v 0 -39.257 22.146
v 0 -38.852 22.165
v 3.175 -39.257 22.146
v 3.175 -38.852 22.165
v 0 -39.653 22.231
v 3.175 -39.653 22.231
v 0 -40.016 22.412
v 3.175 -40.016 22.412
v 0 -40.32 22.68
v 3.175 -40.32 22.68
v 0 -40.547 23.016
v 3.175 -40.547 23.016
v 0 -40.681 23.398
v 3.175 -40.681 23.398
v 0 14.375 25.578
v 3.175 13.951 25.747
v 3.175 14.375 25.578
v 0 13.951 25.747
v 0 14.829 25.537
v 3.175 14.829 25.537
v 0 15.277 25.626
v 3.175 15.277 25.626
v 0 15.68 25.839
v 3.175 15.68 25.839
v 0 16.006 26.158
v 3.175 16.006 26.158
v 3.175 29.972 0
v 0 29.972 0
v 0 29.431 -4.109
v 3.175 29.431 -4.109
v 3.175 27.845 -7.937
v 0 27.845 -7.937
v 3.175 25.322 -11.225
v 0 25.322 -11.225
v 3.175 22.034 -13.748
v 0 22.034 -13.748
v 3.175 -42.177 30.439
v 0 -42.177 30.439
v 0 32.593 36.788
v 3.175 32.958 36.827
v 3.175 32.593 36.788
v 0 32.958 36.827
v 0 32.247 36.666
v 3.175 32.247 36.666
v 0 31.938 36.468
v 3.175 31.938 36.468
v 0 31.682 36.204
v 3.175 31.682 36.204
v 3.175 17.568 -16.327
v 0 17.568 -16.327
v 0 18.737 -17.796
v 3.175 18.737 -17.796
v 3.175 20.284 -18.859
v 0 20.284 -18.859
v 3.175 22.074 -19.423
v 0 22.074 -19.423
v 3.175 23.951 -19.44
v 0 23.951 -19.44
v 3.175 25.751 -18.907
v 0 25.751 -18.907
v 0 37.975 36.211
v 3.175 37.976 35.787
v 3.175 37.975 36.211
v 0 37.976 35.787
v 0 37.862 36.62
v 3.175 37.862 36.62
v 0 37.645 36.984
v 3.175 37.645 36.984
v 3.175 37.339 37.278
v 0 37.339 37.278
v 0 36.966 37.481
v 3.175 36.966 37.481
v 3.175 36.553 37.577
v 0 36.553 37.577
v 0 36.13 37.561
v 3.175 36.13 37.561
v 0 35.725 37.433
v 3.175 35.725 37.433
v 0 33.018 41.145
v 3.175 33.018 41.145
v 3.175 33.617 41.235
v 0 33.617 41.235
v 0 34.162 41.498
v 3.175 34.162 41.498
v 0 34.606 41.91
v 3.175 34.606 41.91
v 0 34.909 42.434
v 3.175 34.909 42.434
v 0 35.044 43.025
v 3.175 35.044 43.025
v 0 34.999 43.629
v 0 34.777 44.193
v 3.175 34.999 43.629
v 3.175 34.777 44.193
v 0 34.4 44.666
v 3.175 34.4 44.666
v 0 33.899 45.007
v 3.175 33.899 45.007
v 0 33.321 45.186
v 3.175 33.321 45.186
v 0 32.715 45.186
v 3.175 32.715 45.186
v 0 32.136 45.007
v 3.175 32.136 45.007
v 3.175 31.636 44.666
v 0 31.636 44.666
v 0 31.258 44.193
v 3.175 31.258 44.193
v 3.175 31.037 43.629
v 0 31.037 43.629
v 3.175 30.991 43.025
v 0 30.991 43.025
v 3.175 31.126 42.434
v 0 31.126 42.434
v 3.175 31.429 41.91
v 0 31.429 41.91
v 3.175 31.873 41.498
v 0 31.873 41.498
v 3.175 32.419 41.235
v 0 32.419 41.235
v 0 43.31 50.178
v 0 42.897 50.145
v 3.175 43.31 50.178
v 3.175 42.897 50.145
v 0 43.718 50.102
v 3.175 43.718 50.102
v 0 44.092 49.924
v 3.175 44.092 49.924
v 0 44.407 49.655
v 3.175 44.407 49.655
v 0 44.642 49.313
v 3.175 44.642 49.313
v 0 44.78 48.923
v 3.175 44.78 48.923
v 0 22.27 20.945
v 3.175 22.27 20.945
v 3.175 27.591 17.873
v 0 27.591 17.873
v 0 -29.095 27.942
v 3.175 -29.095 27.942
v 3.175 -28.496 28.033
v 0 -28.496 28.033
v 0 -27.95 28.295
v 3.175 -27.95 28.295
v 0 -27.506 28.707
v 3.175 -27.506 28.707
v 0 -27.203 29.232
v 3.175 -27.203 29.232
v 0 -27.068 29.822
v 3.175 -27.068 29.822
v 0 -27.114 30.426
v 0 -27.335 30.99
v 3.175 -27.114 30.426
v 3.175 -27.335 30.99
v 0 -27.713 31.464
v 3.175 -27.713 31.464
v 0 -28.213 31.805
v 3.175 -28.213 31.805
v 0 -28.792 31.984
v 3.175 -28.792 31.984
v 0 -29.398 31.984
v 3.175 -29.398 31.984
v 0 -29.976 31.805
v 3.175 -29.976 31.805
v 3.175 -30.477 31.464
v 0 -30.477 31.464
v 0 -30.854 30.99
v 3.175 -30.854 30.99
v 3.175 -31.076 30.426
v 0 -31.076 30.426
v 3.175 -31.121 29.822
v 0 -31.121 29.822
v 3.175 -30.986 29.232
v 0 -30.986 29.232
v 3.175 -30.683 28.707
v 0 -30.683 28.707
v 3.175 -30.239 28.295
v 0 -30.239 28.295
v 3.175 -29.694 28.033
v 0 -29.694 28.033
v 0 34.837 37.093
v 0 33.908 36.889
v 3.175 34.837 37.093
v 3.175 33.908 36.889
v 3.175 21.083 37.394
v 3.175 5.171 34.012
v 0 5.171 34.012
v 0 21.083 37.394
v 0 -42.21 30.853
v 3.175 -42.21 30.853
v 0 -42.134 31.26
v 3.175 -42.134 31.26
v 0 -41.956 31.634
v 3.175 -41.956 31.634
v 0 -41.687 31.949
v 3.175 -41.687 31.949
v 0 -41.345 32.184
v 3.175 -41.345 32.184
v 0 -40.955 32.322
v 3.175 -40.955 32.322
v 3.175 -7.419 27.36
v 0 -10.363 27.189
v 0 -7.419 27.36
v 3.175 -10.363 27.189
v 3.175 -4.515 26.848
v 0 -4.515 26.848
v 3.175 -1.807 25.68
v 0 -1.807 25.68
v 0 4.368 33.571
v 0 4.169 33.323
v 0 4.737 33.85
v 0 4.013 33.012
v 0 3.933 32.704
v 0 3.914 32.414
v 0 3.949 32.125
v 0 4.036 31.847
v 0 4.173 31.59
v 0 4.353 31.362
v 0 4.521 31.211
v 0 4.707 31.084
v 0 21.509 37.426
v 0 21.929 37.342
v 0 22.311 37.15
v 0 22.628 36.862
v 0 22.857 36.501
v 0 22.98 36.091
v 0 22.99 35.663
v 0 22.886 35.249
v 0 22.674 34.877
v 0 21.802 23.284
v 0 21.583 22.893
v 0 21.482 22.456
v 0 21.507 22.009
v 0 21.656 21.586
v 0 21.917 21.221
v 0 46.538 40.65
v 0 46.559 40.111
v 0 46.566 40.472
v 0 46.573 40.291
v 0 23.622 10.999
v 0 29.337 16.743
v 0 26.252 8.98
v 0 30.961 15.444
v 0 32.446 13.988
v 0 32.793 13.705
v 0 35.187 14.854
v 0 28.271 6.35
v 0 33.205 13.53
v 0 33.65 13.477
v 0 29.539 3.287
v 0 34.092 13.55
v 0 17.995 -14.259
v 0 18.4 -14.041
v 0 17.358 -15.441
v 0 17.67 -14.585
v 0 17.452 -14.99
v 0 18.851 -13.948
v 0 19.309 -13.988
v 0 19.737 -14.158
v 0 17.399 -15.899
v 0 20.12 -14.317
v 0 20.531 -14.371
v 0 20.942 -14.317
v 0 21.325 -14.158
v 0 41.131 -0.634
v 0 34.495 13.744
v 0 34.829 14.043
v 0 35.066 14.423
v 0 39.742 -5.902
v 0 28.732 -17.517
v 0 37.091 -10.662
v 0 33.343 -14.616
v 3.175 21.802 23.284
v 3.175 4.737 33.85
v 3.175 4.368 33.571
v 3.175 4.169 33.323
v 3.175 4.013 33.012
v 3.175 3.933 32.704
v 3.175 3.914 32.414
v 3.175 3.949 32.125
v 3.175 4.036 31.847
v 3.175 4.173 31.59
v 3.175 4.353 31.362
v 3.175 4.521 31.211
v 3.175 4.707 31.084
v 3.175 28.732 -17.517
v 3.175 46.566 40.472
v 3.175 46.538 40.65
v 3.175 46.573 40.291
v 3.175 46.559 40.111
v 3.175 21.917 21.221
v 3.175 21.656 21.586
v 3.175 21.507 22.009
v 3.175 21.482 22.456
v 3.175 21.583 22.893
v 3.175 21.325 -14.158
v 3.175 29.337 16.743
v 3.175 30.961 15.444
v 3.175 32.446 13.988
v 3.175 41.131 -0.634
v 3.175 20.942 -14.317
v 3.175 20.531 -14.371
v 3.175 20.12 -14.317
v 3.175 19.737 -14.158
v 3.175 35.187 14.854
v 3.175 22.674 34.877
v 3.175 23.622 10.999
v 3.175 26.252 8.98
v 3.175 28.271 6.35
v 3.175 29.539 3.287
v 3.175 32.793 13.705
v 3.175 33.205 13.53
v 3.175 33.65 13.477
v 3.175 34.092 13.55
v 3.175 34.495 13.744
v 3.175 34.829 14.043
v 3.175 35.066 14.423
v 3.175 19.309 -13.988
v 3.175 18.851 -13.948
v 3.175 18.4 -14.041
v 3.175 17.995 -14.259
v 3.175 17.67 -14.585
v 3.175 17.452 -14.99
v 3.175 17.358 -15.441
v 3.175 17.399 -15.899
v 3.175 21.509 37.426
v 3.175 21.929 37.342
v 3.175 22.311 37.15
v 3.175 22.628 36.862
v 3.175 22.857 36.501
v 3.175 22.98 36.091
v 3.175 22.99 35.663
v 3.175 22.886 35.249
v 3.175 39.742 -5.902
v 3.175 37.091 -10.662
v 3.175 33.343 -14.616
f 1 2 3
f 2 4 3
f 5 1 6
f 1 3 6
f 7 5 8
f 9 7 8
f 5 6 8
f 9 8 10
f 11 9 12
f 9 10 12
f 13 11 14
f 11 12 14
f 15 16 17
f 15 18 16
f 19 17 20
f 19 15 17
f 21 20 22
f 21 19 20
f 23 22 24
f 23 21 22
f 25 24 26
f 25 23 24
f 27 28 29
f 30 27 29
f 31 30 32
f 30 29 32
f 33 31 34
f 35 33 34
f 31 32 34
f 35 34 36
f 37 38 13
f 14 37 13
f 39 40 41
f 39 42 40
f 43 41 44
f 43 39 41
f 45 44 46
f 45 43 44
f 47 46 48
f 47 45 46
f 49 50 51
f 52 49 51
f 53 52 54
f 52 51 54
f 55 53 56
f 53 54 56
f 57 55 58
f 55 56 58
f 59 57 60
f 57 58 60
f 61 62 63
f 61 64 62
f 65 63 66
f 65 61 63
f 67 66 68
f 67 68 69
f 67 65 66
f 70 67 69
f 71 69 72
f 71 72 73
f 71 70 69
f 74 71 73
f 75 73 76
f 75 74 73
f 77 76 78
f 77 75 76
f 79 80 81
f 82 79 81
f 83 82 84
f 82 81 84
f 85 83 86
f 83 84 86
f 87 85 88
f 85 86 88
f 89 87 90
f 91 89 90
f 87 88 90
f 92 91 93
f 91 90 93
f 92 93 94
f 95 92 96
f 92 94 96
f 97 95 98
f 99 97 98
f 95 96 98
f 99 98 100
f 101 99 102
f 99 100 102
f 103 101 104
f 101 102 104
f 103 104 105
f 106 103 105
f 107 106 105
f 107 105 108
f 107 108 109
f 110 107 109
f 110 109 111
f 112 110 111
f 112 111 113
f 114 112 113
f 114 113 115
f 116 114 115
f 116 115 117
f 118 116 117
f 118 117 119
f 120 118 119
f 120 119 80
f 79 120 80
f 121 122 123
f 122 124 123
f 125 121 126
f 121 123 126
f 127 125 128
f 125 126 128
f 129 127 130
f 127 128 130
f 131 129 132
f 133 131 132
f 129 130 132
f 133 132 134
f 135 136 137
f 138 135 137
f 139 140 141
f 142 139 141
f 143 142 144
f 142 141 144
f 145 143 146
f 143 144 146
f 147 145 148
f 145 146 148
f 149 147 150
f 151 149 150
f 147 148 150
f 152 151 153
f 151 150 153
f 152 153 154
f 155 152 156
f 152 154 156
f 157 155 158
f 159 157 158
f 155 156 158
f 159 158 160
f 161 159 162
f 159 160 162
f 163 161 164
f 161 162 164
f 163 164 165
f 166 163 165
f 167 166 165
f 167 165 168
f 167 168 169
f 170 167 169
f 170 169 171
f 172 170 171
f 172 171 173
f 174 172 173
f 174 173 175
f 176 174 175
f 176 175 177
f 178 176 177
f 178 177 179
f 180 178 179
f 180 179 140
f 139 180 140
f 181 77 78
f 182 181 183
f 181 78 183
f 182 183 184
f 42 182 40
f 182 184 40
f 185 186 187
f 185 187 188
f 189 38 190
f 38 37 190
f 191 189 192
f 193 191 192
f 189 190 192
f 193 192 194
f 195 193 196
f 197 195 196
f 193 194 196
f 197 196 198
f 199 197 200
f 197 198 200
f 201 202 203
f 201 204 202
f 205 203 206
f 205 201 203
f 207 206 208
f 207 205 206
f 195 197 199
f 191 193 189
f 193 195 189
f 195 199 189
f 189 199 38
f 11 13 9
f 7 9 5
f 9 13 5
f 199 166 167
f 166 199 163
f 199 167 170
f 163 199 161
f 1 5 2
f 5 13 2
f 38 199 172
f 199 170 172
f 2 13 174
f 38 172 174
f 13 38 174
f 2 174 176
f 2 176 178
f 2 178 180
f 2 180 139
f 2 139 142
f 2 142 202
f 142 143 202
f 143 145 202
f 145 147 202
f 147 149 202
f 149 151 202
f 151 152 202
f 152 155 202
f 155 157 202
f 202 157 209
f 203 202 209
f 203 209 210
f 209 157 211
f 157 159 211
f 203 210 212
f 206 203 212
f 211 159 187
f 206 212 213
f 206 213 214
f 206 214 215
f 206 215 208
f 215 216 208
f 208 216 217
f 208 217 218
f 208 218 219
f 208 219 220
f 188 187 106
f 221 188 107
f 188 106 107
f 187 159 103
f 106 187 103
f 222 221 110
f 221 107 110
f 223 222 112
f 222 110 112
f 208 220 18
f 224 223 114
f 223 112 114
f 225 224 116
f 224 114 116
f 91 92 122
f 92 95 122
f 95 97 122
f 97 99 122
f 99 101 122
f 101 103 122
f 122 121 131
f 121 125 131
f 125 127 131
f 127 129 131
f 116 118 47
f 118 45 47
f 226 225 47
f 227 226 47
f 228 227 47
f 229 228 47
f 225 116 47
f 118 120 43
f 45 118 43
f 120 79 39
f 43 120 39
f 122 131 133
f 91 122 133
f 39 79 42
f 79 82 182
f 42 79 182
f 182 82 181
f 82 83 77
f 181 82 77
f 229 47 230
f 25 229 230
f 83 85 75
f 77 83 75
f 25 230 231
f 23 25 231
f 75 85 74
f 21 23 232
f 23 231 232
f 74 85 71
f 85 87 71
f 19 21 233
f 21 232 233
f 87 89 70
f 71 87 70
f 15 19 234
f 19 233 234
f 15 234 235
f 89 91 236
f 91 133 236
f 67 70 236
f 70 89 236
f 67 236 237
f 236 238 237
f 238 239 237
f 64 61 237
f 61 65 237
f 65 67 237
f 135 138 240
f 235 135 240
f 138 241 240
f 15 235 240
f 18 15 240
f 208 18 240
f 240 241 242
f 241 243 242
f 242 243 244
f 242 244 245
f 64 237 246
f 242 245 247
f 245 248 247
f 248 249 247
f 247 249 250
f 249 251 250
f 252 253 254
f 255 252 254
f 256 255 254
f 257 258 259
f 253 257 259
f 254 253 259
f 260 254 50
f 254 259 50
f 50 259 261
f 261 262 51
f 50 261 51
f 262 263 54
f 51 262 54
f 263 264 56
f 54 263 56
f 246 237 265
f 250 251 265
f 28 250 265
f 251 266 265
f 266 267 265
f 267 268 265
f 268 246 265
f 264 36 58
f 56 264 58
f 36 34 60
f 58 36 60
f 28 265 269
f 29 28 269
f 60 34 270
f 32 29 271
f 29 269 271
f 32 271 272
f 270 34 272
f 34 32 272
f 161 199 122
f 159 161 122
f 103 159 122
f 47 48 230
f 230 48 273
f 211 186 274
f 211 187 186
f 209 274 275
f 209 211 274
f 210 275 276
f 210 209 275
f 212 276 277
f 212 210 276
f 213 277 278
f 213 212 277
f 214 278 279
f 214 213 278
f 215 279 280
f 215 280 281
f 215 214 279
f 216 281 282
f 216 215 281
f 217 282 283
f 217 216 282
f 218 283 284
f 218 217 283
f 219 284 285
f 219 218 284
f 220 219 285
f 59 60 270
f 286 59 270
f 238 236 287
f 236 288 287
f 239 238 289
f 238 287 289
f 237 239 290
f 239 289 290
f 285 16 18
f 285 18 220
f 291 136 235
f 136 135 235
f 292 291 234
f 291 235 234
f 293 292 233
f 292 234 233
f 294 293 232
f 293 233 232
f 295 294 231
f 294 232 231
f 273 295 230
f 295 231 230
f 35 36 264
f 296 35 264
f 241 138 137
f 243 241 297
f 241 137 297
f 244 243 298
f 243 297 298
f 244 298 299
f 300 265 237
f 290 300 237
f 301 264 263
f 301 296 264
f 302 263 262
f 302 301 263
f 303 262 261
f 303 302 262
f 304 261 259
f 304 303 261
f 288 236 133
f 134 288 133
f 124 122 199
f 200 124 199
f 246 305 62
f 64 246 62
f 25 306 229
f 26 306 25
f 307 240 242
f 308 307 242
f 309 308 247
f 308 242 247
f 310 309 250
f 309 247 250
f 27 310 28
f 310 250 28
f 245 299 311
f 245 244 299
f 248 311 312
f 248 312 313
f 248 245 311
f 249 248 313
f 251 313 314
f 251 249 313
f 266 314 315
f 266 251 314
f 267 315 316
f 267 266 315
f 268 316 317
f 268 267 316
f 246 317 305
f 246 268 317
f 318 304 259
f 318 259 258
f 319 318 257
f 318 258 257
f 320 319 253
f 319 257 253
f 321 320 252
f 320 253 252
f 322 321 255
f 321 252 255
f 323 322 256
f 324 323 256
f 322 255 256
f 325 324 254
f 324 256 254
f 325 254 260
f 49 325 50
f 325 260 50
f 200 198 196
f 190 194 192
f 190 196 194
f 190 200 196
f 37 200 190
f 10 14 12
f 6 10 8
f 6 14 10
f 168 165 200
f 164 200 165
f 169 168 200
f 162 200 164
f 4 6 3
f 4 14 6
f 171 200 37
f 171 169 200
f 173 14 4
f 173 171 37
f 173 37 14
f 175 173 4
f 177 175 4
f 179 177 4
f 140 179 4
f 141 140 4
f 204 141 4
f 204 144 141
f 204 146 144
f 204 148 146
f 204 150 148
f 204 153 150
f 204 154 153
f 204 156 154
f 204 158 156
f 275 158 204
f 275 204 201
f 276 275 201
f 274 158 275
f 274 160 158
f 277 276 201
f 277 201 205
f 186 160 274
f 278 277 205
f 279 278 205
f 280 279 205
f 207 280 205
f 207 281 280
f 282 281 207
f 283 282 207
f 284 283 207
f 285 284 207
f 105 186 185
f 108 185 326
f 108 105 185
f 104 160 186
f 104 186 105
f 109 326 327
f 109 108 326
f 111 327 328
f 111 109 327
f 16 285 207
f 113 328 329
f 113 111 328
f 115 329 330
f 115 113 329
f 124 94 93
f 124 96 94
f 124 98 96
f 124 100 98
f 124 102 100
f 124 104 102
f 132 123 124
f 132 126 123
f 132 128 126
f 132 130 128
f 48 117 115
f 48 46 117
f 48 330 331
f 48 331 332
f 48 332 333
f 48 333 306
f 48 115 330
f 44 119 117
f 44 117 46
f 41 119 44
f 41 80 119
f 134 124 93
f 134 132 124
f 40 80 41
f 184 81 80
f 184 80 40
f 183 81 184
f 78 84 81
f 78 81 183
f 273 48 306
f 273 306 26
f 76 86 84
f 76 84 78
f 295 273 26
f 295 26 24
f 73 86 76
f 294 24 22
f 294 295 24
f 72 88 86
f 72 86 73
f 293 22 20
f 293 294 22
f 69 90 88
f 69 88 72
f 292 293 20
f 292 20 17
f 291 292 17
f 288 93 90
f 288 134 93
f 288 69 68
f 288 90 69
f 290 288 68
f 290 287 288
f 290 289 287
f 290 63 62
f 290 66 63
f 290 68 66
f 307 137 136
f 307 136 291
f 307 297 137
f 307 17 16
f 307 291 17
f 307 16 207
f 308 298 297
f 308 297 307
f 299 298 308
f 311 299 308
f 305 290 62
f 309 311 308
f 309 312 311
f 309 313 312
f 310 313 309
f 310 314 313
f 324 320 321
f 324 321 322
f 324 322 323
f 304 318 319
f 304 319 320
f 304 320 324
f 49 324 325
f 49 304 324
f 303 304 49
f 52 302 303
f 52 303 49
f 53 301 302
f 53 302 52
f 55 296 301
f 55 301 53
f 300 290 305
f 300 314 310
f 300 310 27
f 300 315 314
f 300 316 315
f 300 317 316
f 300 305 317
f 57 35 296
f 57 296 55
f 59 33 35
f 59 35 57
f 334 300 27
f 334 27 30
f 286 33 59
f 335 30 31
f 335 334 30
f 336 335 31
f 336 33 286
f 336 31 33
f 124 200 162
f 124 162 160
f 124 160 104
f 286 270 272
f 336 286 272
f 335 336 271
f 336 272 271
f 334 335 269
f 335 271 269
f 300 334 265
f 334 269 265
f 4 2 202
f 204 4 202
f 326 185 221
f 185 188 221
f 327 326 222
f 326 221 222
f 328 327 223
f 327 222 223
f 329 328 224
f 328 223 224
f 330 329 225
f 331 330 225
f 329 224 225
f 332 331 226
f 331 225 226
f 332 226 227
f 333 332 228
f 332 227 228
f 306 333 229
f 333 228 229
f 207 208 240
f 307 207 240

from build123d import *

# Parameters (mm, degrees)
BOSS_EXTRUDE1_DEPTH = 3.175
FILLET1_R           = 12.7
FILLET2_R           = 1.5875
FILLET3_R           = 1.5875
SKETCH2_R           = 2.032
CUT_EXTRUDE1_DEPTH  = 69.535995798
FILLET4_R           = 1.5875


with BuildPart() as part:
    # Sketch1 → Boss-Extrude1 (new body)
    with BuildSketch(Plane(origin=(0, 0, 0), x_dir=(0, 0, -1), z_dir=(1, 0, 0))):
        with BuildLine():
            Line((13.748153285, 22.0345), (14.739116884, 20.318100699))
            ThreePointArc((14.739116884, 20.318100699), (14.158051555, 18.149535371), (16.326616884, 17.568470042))
            ThreePointArc((16.326616884, 17.568470042), (19.207719521, 21.158249529), (18.906671331, 25.751357318))
            Line((18.906671331, 25.751357318), (17.516713222, 28.732132102))
            ThreePointArc((17.516713222, 28.732132102), (10.661882173, 37.091365139), (0.634495892, 41.130797035))
            Line((0.634495892, 41.130797035), (-40.382266976, 46.59538876))
            Line((-40.382266976, 46.59538876), (-50.475527532, 44.45))
            Line((-50.475527532, 44.45), (-31.992178218, -42.507321705))
            Line((-31.992178218, -42.507321705), (-21.898917663, -40.361932946))
            Line((-21.898917663, -40.361932946), (-27.991294866, -5.810344877))
            Line((-27.991294866, -5.810344877), (-10.998522628, 23.622))
            ThreePointArc((-10.998522628, 23.622), (-6.35, 28.270522628), (0, 29.972))
            ThreePointArc((0, 29.972), (7.9375, 27.845153285), (13.748153285, 22.0345))
        make_face()
    extrude(amount=BOSS_EXTRUDE1_DEPTH)

    # Fillet1
    fillet1_edges = [part.edges().sort_by_distance(p)[0] for p in [
        (1.5875, -5.810344877, 27.991294866),
    ]]
    fillet(fillet1_edges, radius=FILLET1_R)

    # Fillet2
    fillet2_edges = [part.edges().sort_by_distance(p)[0] for p in [
        (1.5875, -40.361932946, 21.898917663),
        (1.5875, -42.507321705, 31.992178218),
        (1.5875, 44.45, 50.475527532),
        (1.5875, 46.59538876, 40.382266976),
    ]]
    fillet(fillet2_edges, radius=FILLET2_R)

    # Fillet3
    fillet3_edges = [part.edges().sort_by_distance(p)[0] for p in [
        (1.5875, 20.318100699, -14.739116884),
    ]]
    fillet(fillet3_edges, radius=FILLET3_R)

    # Sketch2 → Cut-Extrude1 (cut, through all)
    with BuildSketch(Plane(origin=(3.175, 0, 0), x_dir=(0, 0, -1), z_dir=(1, 0, 0))):
        with Locations((-43.17662111, 33.017704898)):
            Circle(SKETCH2_R)
        with Locations((-29.974228743, -29.094667748)):
            Circle(SKETCH2_R)
        with BuildLine():
            Line((-21.848305026, 20.704625636), (-17.872599271, 27.59075))
            ThreePointArc((-17.872599271, 27.59075), (-14.903788227, 31.547275925), (-11.078768079, 34.683700207))
            Line((-11.078768079, 34.683700207), (-40.047392283, 38.543139447))
            ThreePointArc((-40.047392283, 38.543139447), (-37.495523437, 35.854539267), (-36.879589172, 32.199237568))
            Line((-36.879589172, 32.199237568), (-21.848305026, 20.704625636))
        make_face()
        with BuildLine():
            Line((-38.286199293, 25.280985715), (-25.05001183, 15.159106781))
            Line((-25.05001183, 15.159106781), (-32.554160521, 2.161539981))
            ThreePointArc((-32.554160521, 2.161539981), (-32.855452365, 1.621137898), (-33.140409238, 1.071946887))
            Line((-33.140409238, 1.071946887), (-38.286199293, 25.280985715))
        make_face()
    extrude(amount=-CUT_EXTRUDE1_DEPTH, mode=Mode.SUBTRACT)

    # Fillet4
    fillet4_edges = [part.edges().sort_by_distance(p)[0] for p in [
        (1.5875, 20.704625636, 21.848305026),
        (1.5875, 34.683700207, 11.078768079),
        (1.5875, 38.543139447, 40.047392283),
        (1.5875, 32.199237568, 36.879589172),
        (1.5875, 25.280985715, 38.286199293),
        (1.5875, 1.071946887, 33.140409238),
        (1.5875, 15.159106781, 25.05001183),
    ]]
    fillet(fillet4_edges, radius=FILLET4_R - 0.0001)  # a hair under: the kernel refuses the full size


solid = part.part
